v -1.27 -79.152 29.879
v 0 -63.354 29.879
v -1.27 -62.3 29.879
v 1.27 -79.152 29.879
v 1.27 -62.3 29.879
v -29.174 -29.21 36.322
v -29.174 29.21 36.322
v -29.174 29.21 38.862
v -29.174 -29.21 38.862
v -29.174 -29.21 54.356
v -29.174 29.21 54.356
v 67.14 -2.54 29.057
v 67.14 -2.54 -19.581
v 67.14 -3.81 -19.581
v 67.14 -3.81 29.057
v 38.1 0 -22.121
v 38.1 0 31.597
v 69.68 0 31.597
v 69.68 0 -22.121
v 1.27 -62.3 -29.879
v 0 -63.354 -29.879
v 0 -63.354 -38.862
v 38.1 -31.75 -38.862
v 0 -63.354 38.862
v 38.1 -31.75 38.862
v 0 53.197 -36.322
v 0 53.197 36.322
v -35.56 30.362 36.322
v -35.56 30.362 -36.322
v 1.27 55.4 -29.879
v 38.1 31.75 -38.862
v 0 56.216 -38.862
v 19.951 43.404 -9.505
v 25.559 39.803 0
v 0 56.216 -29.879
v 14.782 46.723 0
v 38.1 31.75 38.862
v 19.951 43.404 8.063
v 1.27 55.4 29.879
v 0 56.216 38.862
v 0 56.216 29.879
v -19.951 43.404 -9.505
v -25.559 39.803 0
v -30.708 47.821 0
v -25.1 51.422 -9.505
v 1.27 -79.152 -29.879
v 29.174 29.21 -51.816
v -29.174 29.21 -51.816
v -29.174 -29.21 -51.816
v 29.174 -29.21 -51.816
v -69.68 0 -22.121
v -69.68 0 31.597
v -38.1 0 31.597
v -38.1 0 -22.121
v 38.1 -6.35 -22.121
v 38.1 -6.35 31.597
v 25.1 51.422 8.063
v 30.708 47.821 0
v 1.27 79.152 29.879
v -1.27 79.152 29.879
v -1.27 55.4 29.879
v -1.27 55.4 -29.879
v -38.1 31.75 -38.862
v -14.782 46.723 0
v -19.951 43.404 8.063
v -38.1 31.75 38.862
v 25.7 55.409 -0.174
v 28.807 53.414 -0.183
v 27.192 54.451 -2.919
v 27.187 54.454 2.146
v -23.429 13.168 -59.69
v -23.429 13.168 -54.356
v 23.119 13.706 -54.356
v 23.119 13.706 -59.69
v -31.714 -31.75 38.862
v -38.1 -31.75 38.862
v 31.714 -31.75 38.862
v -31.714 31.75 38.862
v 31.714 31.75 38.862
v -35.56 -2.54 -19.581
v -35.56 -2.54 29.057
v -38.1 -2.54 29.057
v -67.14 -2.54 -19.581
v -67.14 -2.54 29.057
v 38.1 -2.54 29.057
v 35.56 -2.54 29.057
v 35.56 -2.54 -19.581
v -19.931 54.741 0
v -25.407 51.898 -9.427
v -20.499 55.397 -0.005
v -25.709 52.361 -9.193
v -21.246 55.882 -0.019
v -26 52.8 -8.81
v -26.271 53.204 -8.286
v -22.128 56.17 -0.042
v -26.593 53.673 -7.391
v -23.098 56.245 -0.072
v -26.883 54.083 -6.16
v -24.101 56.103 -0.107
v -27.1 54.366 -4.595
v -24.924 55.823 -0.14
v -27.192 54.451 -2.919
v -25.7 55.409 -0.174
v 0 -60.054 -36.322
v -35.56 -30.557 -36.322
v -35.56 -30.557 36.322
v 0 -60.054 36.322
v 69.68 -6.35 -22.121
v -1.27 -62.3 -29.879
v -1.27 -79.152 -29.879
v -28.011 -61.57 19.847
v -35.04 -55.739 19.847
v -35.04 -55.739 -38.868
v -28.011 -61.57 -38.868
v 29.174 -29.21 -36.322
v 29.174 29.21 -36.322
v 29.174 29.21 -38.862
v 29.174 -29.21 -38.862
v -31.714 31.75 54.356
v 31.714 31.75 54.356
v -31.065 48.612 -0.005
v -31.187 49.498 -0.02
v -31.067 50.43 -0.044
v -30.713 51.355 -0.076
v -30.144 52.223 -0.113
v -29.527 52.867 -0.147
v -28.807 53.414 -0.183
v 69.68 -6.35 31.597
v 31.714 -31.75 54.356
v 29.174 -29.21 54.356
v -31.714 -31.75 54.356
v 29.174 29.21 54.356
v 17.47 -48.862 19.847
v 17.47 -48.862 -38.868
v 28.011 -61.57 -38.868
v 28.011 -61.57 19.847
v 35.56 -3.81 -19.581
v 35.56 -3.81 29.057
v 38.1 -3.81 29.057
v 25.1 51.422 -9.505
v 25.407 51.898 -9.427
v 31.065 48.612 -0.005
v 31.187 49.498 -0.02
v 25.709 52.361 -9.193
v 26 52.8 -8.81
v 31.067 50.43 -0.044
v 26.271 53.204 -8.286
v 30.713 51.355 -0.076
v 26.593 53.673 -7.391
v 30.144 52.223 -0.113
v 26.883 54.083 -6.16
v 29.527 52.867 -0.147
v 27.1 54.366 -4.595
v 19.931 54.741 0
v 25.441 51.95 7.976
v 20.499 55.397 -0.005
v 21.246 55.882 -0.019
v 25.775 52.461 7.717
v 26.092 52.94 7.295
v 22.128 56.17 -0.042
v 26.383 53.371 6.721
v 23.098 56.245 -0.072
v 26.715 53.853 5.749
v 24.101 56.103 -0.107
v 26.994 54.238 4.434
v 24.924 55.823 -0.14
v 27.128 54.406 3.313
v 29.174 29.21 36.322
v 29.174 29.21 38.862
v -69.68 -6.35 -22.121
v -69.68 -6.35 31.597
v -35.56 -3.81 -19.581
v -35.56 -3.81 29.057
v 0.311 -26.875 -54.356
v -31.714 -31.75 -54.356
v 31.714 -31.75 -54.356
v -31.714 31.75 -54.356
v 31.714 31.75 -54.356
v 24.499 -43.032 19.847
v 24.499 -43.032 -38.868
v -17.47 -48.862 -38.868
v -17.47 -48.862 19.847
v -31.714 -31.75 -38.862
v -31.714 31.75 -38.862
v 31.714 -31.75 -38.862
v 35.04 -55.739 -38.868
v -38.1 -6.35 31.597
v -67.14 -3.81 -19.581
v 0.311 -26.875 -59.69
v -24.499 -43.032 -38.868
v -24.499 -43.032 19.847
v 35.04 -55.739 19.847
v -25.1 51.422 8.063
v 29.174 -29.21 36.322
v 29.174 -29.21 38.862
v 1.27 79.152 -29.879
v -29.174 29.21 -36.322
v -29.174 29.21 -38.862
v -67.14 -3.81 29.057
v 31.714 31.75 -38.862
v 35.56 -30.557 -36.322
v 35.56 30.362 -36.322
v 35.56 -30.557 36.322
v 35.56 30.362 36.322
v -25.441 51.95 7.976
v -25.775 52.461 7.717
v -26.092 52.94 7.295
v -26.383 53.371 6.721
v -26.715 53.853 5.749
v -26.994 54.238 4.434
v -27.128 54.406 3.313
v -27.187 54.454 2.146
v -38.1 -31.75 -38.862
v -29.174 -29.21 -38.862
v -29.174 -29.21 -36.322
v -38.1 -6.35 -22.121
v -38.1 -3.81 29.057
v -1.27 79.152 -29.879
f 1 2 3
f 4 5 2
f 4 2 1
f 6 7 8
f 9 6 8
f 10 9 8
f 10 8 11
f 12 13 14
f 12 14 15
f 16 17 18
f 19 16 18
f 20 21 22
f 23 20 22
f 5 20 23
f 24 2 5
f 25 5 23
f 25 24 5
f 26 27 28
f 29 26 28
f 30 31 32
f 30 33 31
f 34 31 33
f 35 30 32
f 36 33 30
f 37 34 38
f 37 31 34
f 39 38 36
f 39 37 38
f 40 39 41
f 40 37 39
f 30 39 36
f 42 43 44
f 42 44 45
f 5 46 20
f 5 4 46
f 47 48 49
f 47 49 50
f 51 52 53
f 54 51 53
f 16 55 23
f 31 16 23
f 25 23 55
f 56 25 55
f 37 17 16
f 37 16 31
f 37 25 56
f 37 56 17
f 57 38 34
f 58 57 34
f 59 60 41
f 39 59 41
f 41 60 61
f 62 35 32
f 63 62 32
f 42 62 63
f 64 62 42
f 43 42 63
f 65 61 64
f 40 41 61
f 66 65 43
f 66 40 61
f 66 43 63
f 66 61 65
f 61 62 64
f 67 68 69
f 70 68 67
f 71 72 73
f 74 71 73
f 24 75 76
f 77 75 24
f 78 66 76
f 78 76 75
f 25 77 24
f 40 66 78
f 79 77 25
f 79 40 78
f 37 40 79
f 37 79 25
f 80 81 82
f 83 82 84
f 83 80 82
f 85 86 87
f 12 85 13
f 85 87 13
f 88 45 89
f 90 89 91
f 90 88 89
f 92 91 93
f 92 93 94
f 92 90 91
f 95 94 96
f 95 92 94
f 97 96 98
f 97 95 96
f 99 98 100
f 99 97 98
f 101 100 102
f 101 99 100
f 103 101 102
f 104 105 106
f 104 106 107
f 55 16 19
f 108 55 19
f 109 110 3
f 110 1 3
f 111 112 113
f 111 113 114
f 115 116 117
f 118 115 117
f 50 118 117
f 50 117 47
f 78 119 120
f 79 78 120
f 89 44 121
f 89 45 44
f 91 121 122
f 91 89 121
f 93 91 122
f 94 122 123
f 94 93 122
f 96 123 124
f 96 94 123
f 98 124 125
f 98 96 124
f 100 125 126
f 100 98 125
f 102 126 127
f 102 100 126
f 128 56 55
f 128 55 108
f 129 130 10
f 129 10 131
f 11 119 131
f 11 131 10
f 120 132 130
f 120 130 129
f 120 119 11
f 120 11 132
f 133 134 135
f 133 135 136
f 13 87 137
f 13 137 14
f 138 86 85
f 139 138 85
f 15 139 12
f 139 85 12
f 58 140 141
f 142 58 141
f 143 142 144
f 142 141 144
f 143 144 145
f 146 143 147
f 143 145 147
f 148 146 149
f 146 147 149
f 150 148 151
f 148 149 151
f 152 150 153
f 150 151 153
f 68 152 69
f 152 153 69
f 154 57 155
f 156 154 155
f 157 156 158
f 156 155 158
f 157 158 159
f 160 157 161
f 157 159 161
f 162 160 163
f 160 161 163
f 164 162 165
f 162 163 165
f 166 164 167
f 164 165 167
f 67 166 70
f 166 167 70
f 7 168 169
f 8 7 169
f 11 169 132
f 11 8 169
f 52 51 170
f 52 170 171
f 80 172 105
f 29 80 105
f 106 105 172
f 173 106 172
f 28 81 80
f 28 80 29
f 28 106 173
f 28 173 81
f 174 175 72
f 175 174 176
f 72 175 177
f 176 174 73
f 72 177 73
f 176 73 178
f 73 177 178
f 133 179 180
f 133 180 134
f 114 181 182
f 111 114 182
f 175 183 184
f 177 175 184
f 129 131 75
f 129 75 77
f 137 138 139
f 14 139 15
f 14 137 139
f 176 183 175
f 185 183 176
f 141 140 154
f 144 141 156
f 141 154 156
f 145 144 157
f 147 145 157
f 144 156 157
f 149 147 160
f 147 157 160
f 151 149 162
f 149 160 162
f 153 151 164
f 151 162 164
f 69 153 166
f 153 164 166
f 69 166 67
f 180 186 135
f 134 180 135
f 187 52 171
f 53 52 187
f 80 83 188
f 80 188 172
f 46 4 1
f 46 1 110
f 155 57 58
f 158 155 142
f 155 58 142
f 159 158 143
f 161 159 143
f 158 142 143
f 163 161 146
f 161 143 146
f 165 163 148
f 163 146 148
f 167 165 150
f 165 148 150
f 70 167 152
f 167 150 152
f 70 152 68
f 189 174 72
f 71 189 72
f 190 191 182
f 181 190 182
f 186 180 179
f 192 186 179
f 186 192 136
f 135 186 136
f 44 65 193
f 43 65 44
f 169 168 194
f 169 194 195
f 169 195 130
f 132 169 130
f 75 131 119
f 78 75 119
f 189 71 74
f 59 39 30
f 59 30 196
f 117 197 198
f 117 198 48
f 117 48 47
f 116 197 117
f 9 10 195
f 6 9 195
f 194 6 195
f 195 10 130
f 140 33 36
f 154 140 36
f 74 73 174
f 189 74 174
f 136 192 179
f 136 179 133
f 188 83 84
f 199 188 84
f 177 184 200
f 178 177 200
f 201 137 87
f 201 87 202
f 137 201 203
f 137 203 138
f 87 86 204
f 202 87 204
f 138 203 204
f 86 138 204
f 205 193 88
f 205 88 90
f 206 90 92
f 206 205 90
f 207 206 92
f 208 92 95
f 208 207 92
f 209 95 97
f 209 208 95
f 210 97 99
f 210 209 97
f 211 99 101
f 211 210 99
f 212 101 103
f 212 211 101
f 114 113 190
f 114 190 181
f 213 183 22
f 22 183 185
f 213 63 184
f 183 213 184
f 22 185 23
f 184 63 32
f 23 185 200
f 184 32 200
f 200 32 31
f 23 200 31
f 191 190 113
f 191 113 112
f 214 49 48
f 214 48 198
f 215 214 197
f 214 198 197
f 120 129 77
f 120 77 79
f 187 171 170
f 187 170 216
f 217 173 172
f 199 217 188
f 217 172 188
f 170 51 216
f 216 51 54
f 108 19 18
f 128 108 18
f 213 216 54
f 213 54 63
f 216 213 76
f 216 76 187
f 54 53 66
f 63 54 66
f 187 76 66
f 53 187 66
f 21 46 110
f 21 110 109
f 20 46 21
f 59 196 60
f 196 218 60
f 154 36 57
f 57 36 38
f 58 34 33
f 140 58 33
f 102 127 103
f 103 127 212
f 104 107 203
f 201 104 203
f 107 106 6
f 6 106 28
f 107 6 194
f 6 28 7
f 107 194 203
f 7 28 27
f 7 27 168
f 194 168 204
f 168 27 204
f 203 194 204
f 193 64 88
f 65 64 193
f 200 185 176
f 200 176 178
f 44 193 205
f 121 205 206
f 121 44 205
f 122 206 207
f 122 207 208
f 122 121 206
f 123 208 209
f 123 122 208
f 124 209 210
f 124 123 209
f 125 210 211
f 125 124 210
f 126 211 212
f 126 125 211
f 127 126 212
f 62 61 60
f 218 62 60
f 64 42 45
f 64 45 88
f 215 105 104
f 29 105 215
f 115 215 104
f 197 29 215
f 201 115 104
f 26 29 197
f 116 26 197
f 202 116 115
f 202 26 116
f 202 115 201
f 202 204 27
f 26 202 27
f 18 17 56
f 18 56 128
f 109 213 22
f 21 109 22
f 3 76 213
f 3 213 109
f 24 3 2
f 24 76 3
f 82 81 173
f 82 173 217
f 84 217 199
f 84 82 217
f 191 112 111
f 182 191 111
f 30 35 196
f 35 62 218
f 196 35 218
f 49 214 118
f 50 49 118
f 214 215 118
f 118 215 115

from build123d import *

# Parameters (mm, degrees)
F0_W         = 6.3855407542
F0_H         = 63.4993868415
F3_DEPTH     = 38.862
F0_W_2       = 63.4289184916
F4_DEPTH     = 54.356
F5_DEPTH     = 1.27
F1_W         = 40.2324178779
F1_H         = 53.7178423256
F6_DEPTH     = 6.35
F7_T         = 2.54
F7_T3_DEPTH  = 68.5793868415
F7_T5_DEPTH  = 68.5089184916
F7_T7_DEPTH  = 6.5892994553
F7_T9_DEPTH  = 64.8371359067
F7_T11_DEPTH = 6.5892994553
F7_T13_DEPTH = 58.7978423256
F7_T15_DEPTH = 11.43
F7_T17_DEPTH = 6.7300617299
F7_T19_DEPTH = 6.7300617299
F7_T21_DEPTH = 6.7300617299
F7_T23_DEPTH = 6.7300617299
F7_T25_DEPTH = 6.5892994553
F7_T27_DEPTH = 6.5892994553
F9_DEPTH     = 5.334
F11_DEPTH    = 13.208
F12_R        = 3.6792614691
F13_W        = 9.1328918934
F13_H        = 58.7153472006
F14_DEPTH    = 16.51


# Not quite as in the source:
# - a pattern or mirror of a feature is missing from the dataset's text; its kind, count and spacing are read off the source's solid
# - a shell that OpenCascade refuses in one call is made with other operations: the cavity is built on its own and cut out


with BuildPart() as f3:
    # F0 (on Top) → F3 (new body, symmetric)
    with BuildSketch(Plane.XY):
        Polygon((31.7144592458, 31.7496934207), (38.1, 31.7496934207), (0, 56.2155136837), (-38.1, 31.7496934207), (-31.7144592458, 31.7496934207), align=None)
        Polygon((0, -63.3538599396), (38.1, -31.7496934207), (31.7144592458, -31.7496934207), (-31.7144592458, -31.7496934207), (-38.1, -31.7496934207), align=None)
        with Locations((-34.9072296229, 0)):
            Rectangle(F0_W, F0_H)
        with Locations((34.9072296229, 0)):
            Rectangle(F0_W, F0_H)
    extrude(amount=F3_DEPTH, both=True)

    # F0 (on Top) → F4 (join, symmetric)
    with BuildSketch(Plane.XY):
        Rectangle(F0_W_2, F0_H)
    extrude(amount=F4_DEPTH, both=True)

    # F2 (on Right) → F5 (join, symmetric)
    with BuildSketch(Plane.YZ):
        Polygon((52.2253494244, 29.8785679533), (52.2253494244, 0), (52.2253494244, -29.8785679533), (79.1521295905, -29.8785679533), (79.1521295905, 29.8785679533), align=None)
        Polygon((-52.2253494244, -29.8785679533), (-52.2253494244, 0), (-52.2253494244, 29.8785679533), (-79.1521295905, 29.8785679533), (-79.1521295905, -29.8785679533), align=None)
    extrude(amount=F5_DEPTH, both=True)

    # F1 (on Front) → F6 (join)
    with BuildSketch(Plane.XZ):
        with Locations((49.563405104, 4.7380579636)):
            Rectangle(F1_W, F1_H)
        with Locations((-49.563405104, 4.7380579636)):
            Rectangle(F1_W, F1_H)
    extrude(amount=F6_DEPTH)

    # F7: shell of thickness 2.54, made by hand


with BuildPart() as f7_core1:
    # F7_t2: copy of F3
    add(f3.part)

    # the walls: a layer under each face that stays
    f7_faces = [f7_core1.faces().sort_by_distance(p)[0] for p in [
        (-31.7144592458, 0, -46.609),
        (0, 31.7496934207, -46.609),
        (-25.4, 36.2872847465, -38.862),
        (0, -31.7496934207, -46.609),
        (0, 0, -54.356),
        (31.7144592458, 0, -46.609),
        (-19.05, 43.9826035522, 0),
        (-38.1, 21.1664622805, -25.908),
        (-19.05, -47.5517766802, 0),
        (19.05, -47.5517766802, 0),
        (38.1, -21.1664622805, -25.908),
        (19.05, 43.9826035522, 0),
        (0, 67.276057966, -29.8785679533),
        (-1.27, 67.276057966, 0),
        (0, 67.276057966, 29.8785679533),
        (-25.4, 36.2872847465, 38.862),
        (-53.8898070215, 0, 4.7380579636),
        (-53.8898070215, -3.175, -22.1208631992),
        (-53.8898070215, -6.35, 4.7380579636),
        (-53.8898070215, -3.175, 31.5969791263),
        (0, -70.7262586564, 29.8785679533),
        (-1.27, -70.7262586564, 0),
        (0, -70.7262586564, -29.8785679533),
        (1.27, -70.7262586564, 0),
        (53.8898070215, 0, 4.7380579636),
        (53.8898070215, -3.175, 31.5969791263),
        (53.8898070215, -6.35, 4.7380579636),
        (53.8898070215, -3.175, -22.1208631992),
        (1.27, 67.276057966, 0),
        (0, 79.1521295905, 0),
        (0, -31.7496934207, 46.609),
        (-31.7144592458, 0, 46.609),
        (0, 31.7496934207, 46.609),
        (31.7144592458, 0, 46.609),
        (-69.679614043, -3.175, 4.7380579636),
        (0, -79.1521295905, 0),
        (69.679614043, -3.175, 4.7380579636),
    ]]
    thicken(f7_faces, amount=-F7_T, mode=Mode.SUBTRACT)

    # F7_s4 → F7_t3 (cut)
    with BuildSketch(Plane.XZ.offset(-34.2896934207)):
        Polygon((-31.7398592458, -38.8874), (-29.1744592458, -38.862), (-29.1744592458, -36.322), (-31.7144592458, -36.322), align=None)
        Polygon((31.7398592458, -38.8874), (31.7144592458, -36.322), (29.1744592458, -36.322), (29.1744592458, -38.862), align=None)
        Polygon((-31.7398592458, 38.8874), (-31.7144592458, 36.322), (-29.1744592458, 36.322), (-29.1744592458, 38.862), align=None)
        Polygon((31.7398592458, 38.8874), (31.7144592458, 36.322), (29.1744592458, 36.322), (29.1744592458, 38.862), align=None)
    extrude(amount=F7_T3_DEPTH, mode=Mode.SUBTRACT)

    # F7_s6 → F7_t5 (cut)
    with BuildSketch(Plane.YZ.offset(-34.2544592458)):
        Polygon((31.7750934207, -38.8874), (29.2096934207, -38.862), (29.2096934207, -36.322), (31.7496934207, -36.322), align=None)
        Polygon((-31.7750934207, -38.8874), (-31.7496934207, -36.322), (-29.2096934207, -36.322), (-29.2096934207, -38.862), align=None)
        Polygon((-31.7750934207, 38.8874), (-31.7496934207, 36.322), (-29.2096934207, 36.322), (-29.2096934207, 38.862), align=None)
        Polygon((31.7750934207, 38.8874), (31.7496934207, 36.322), (29.2096934207, 36.322), (29.2096934207, 38.862), align=None)
    extrude(amount=F7_T5_DEPTH, mode=Mode.SUBTRACT)

    # F7_s8 → F7_t7 (cut)
    with BuildSketch(Plane(origin=(27.6965031812, 17.7852406494, 0), x_dir=(0, 0, 1), z_dir=(-0.8414499823, -0.5403350139, 0))):
        Polygon((-29.9039679533, 47.3279429967), (-29.8785679533, 44.7625429967), (-27.3385679533, 44.7625429967), (-27.3385679533, 47.3025429967), align=None)
    extrude(amount=F7_T7_DEPTH, mode=Mode.SUBTRACT)

    # F7_s10 → F7_t9 (cut)
    with BuildSketch(Plane.XY.offset(-32.4185679533)):
        Polygon((-1.3091245094, 55.4213591711), (0.1024509352, 53.2627033864), (1.27, 54.0124421152), (1.27, 55.3999863416), align=None)
        Polygon((-1.3116164808, -62.319937294), (0.3516480774, -60.3454305583), (1.27, -61.1072086971), (1.27, -62.3003877224), align=None)
        Polygon((1.3116164808, -62.319937294), (-0.3516480774, -60.3454305583), (-1.27, -61.1072086971), (-1.27, -62.3003877224), align=None)
        Polygon((1.3091245094, 55.4213591711), (-0.1024509352, 53.2627033864), (-1.27, 54.0124421152), (-1.27, 55.3999863416), align=None)
    extrude(amount=F7_T9_DEPTH, mode=Mode.SUBTRACT)

    # F7_s12 → F7_t11 (cut)
    with BuildSketch(Plane(origin=(22.1519372709, 14.2248114369, 0), x_dir=(0, 0, 1), z_dir=(0.8414499823, 0.5403350139, 0))):
        Polygon((29.9039679533, -47.3279429967), (29.8785679533, -44.7625429967), (27.3385679533, -44.7625429967), (27.3385679533, -47.3025429967), align=None)
    extrude(amount=F7_T11_DEPTH, mode=Mode.SUBTRACT)

    # F7_s14 → F7_t13 (cut)
    with BuildSketch(Plane.XY.offset(-24.6608631992)):
        Polygon((-38.1254, 0.0254), (-35.56, 0), (-35.56, -2.54), (-38.1, -2.54), align=None)
        Polygon((-38.1254, -6.3754), (-35.56, -6.35), (-35.56, -3.81), (-38.1, -3.81), align=None)
        Polygon((38.1254, 0.0254), (35.56, 0), (35.56, -2.54), (38.1, -2.54), align=None)
        Polygon((38.1254, -6.3754), (35.56, -6.35), (35.56, -3.81), (38.1, -3.81), align=None)
    extrude(amount=F7_T13_DEPTH, mode=Mode.SUBTRACT)

    # F7_s16 → F7_t15 (cut)
    with BuildSketch(Plane.XZ.offset(-2.54)):
        Polygon((-38.1254, -22.1462631992), (-35.56, -22.1208631992), (-35.56, -19.5808631992), (-38.1, -19.5808631992), align=None)
        Polygon((-38.1254, 31.6223791263), (-35.56, 31.5969791263), (-35.56, 29.0569791263), (-38.1, 29.0569791263), align=None)
        Polygon((38.1254, 31.6223791263), (35.56, 31.5969791263), (35.56, 29.0569791263), (38.1, 29.0569791263), align=None)
        Polygon((38.1254, -22.1462631992), (35.56, -22.1208631992), (35.56, -19.5808631992), (38.1, -19.5808631992), align=None)
    extrude(amount=F7_T15_DEPTH, mode=Mode.SUBTRACT)

    # F7_s18 → F7_t17 (cut)
    with BuildSketch(Plane(origin=(33.0864182791, -27.4453719897, 0), x_dir=(0, 0, 1), z_dir=(-0.7696681748, 0.638444125, 0))):
        Polygon((29.9039679533, -48.7868497466), (29.8785679533, -46.2214497466), (27.3385679533, -46.2214497466), (27.3385679533, -48.7614497466), align=None)
    extrude(amount=F7_T17_DEPTH, mode=Mode.SUBTRACT)

    # F7_s20 → F7_t19 (cut)
    with BuildSketch(Plane(origin=(27.9065039511, -23.1486036176, 0), x_dir=(0, 0, 1), z_dir=(0.7696681748, -0.638444125, 0))):
        Polygon((-29.9039679533, 48.7868497466), (-29.8785679533, 46.2214497466), (-27.3385679533, 46.2214497466), (-27.3385679533, 48.7614497466), align=None)
    extrude(amount=F7_T19_DEPTH, mode=Mode.SUBTRACT)

    # F7_s22 → F7_t21 (cut)
    with BuildSketch(Plane(origin=(-33.0864182791, -27.4453719897, 0), x_dir=(0, 0, 1), z_dir=(0.7696681748, 0.638444125, 0))):
        Polygon((-29.9039679533, 48.7868497466), (-29.8785679533, 46.2214497466), (-27.3385679533, 46.2214497466), (-27.3385679533, 48.7614497466), align=None)
    extrude(amount=F7_T21_DEPTH, mode=Mode.SUBTRACT)

    # F7_s24 → F7_t23 (cut)
    with BuildSketch(Plane(origin=(-27.9065039511, -23.1486036176, 0), x_dir=(0, 0, 1), z_dir=(-0.7696681748, -0.638444125, 0))):
        Polygon((29.9039679533, -48.7868497466), (29.8785679533, -46.2214497466), (27.3385679533, -46.2214497466), (27.3385679533, -48.7614497466), align=None)
    extrude(amount=F7_T23_DEPTH, mode=Mode.SUBTRACT)

    # F7_s26 → F7_t25 (cut)
    with BuildSketch(Plane(origin=(-27.6965031812, 17.7852406494, 0), x_dir=(0, 0, 1), z_dir=(0.8414499823, -0.5403350139, 0))):
        Polygon((29.9039679533, -47.3279429967), (29.8785679533, -44.7625429967), (27.3385679533, -44.7625429967), (27.3385679533, -47.3025429967), align=None)
    extrude(amount=F7_T25_DEPTH, mode=Mode.SUBTRACT)

    # F7_s28 → F7_t27 (cut)
    with BuildSketch(Plane(origin=(-22.1519372709, 14.2248114369, 0), x_dir=(0, 0, 1), z_dir=(-0.8414499823, 0.5403350139, 0))):
        Polygon((-29.9039679533, 47.3279429967), (-29.8785679533, 44.7625429967), (-27.3385679533, 44.7625429967), (-27.3385679533, 47.3025429967), align=None)
    extrude(amount=F7_T27_DEPTH, mode=Mode.SUBTRACT)


with BuildPart() as f3_1:
    add(f3.part)

    # what is left inside the walls is the cavity
    f7_cavity = [f7_core1.part.solids().sort_by_distance(p)[0] for p in [
        (-35.5346, -0.097183, -12.107333),
    ]]
    add(f7_cavity, mode=Mode.SUBTRACT)

    # F8 (on face) → F9 (join)
    with BuildSketch(Plane(origin=(0, 0, -54.356), x_dir=(1, 0, 0), z_dir=(0, 0, -1))):
        Polygon((23.1188687153, -13.7063056679), (0.3105745427, 26.8746804482), (-23.4294432581, -13.1683747803), align=None)
    extrude(amount=F9_DEPTH)

    # F10 (on face) → F11 (join)
    with BuildSketch(Plane(origin=(25.559220226, 39.8027239695, 0), x_dir=(-0.8414499823, 0.5403350139, 0), z_dir=(0.5403350139, 0.8414499823, 0))):
        Polygon((6.6651697271, -9.5054283738), (6.6651697271, 0), (6.6651697271, 8.0630239099), (0, 0), align=None)
        Polygon((6.6651697271, 8.0630239099), (6.6651697271, 0), (6.6651697271, -9.5054283738), (12.8076681867, 0), align=None)
    f11 = extrude(amount=F11_DEPTH)

    # F11_copies: F11 across plane
    add(f11.mirror(Plane(origin=(0, 0, 0), x_dir=(0, 0, -1), z_dir=(-1, 0, 0))))

    # F12
    f12_edges = [f3_1.edges().sort_by_distance(p)[0] for p in [
        (29.891762, 52.717308, 4.031512),
        (24.503256, 56.177523, -4.752714),
        (24.503256, 56.177523, 4.031512),
        (29.891762, 52.717308, -4.752714),
        (-24.503256, 56.177523, 4.031512),
        (-24.503256, 56.177523, -4.752714),
        (-29.891762, 52.717308, -4.752714),
        (-29.891762, 52.717308, 4.031512),
    ]]
    fillet(f12_edges, radius=F12_R)


with BuildPart() as f14:
    # F13 (on face) → F14 (new body)
    with BuildSketch(Plane(origin=(-31.1314611151, -37.5301360273, 0), x_dir=(0.7696681748, -0.638444125, 0), z_dir=(-0.638444125, -0.7696681748, 0))):
        with Locations((13.183509931, -9.5102321357)):
            Rectangle(F13_W, F13_H)
    extrude(amount=F14_DEPTH)


with BuildPart() as f15_1:
    # F15: instance of F14
    add(f14.part.mirror(Plane.YZ))


solid = Compound([f3_1.part, f14.part, f15_1.part])
